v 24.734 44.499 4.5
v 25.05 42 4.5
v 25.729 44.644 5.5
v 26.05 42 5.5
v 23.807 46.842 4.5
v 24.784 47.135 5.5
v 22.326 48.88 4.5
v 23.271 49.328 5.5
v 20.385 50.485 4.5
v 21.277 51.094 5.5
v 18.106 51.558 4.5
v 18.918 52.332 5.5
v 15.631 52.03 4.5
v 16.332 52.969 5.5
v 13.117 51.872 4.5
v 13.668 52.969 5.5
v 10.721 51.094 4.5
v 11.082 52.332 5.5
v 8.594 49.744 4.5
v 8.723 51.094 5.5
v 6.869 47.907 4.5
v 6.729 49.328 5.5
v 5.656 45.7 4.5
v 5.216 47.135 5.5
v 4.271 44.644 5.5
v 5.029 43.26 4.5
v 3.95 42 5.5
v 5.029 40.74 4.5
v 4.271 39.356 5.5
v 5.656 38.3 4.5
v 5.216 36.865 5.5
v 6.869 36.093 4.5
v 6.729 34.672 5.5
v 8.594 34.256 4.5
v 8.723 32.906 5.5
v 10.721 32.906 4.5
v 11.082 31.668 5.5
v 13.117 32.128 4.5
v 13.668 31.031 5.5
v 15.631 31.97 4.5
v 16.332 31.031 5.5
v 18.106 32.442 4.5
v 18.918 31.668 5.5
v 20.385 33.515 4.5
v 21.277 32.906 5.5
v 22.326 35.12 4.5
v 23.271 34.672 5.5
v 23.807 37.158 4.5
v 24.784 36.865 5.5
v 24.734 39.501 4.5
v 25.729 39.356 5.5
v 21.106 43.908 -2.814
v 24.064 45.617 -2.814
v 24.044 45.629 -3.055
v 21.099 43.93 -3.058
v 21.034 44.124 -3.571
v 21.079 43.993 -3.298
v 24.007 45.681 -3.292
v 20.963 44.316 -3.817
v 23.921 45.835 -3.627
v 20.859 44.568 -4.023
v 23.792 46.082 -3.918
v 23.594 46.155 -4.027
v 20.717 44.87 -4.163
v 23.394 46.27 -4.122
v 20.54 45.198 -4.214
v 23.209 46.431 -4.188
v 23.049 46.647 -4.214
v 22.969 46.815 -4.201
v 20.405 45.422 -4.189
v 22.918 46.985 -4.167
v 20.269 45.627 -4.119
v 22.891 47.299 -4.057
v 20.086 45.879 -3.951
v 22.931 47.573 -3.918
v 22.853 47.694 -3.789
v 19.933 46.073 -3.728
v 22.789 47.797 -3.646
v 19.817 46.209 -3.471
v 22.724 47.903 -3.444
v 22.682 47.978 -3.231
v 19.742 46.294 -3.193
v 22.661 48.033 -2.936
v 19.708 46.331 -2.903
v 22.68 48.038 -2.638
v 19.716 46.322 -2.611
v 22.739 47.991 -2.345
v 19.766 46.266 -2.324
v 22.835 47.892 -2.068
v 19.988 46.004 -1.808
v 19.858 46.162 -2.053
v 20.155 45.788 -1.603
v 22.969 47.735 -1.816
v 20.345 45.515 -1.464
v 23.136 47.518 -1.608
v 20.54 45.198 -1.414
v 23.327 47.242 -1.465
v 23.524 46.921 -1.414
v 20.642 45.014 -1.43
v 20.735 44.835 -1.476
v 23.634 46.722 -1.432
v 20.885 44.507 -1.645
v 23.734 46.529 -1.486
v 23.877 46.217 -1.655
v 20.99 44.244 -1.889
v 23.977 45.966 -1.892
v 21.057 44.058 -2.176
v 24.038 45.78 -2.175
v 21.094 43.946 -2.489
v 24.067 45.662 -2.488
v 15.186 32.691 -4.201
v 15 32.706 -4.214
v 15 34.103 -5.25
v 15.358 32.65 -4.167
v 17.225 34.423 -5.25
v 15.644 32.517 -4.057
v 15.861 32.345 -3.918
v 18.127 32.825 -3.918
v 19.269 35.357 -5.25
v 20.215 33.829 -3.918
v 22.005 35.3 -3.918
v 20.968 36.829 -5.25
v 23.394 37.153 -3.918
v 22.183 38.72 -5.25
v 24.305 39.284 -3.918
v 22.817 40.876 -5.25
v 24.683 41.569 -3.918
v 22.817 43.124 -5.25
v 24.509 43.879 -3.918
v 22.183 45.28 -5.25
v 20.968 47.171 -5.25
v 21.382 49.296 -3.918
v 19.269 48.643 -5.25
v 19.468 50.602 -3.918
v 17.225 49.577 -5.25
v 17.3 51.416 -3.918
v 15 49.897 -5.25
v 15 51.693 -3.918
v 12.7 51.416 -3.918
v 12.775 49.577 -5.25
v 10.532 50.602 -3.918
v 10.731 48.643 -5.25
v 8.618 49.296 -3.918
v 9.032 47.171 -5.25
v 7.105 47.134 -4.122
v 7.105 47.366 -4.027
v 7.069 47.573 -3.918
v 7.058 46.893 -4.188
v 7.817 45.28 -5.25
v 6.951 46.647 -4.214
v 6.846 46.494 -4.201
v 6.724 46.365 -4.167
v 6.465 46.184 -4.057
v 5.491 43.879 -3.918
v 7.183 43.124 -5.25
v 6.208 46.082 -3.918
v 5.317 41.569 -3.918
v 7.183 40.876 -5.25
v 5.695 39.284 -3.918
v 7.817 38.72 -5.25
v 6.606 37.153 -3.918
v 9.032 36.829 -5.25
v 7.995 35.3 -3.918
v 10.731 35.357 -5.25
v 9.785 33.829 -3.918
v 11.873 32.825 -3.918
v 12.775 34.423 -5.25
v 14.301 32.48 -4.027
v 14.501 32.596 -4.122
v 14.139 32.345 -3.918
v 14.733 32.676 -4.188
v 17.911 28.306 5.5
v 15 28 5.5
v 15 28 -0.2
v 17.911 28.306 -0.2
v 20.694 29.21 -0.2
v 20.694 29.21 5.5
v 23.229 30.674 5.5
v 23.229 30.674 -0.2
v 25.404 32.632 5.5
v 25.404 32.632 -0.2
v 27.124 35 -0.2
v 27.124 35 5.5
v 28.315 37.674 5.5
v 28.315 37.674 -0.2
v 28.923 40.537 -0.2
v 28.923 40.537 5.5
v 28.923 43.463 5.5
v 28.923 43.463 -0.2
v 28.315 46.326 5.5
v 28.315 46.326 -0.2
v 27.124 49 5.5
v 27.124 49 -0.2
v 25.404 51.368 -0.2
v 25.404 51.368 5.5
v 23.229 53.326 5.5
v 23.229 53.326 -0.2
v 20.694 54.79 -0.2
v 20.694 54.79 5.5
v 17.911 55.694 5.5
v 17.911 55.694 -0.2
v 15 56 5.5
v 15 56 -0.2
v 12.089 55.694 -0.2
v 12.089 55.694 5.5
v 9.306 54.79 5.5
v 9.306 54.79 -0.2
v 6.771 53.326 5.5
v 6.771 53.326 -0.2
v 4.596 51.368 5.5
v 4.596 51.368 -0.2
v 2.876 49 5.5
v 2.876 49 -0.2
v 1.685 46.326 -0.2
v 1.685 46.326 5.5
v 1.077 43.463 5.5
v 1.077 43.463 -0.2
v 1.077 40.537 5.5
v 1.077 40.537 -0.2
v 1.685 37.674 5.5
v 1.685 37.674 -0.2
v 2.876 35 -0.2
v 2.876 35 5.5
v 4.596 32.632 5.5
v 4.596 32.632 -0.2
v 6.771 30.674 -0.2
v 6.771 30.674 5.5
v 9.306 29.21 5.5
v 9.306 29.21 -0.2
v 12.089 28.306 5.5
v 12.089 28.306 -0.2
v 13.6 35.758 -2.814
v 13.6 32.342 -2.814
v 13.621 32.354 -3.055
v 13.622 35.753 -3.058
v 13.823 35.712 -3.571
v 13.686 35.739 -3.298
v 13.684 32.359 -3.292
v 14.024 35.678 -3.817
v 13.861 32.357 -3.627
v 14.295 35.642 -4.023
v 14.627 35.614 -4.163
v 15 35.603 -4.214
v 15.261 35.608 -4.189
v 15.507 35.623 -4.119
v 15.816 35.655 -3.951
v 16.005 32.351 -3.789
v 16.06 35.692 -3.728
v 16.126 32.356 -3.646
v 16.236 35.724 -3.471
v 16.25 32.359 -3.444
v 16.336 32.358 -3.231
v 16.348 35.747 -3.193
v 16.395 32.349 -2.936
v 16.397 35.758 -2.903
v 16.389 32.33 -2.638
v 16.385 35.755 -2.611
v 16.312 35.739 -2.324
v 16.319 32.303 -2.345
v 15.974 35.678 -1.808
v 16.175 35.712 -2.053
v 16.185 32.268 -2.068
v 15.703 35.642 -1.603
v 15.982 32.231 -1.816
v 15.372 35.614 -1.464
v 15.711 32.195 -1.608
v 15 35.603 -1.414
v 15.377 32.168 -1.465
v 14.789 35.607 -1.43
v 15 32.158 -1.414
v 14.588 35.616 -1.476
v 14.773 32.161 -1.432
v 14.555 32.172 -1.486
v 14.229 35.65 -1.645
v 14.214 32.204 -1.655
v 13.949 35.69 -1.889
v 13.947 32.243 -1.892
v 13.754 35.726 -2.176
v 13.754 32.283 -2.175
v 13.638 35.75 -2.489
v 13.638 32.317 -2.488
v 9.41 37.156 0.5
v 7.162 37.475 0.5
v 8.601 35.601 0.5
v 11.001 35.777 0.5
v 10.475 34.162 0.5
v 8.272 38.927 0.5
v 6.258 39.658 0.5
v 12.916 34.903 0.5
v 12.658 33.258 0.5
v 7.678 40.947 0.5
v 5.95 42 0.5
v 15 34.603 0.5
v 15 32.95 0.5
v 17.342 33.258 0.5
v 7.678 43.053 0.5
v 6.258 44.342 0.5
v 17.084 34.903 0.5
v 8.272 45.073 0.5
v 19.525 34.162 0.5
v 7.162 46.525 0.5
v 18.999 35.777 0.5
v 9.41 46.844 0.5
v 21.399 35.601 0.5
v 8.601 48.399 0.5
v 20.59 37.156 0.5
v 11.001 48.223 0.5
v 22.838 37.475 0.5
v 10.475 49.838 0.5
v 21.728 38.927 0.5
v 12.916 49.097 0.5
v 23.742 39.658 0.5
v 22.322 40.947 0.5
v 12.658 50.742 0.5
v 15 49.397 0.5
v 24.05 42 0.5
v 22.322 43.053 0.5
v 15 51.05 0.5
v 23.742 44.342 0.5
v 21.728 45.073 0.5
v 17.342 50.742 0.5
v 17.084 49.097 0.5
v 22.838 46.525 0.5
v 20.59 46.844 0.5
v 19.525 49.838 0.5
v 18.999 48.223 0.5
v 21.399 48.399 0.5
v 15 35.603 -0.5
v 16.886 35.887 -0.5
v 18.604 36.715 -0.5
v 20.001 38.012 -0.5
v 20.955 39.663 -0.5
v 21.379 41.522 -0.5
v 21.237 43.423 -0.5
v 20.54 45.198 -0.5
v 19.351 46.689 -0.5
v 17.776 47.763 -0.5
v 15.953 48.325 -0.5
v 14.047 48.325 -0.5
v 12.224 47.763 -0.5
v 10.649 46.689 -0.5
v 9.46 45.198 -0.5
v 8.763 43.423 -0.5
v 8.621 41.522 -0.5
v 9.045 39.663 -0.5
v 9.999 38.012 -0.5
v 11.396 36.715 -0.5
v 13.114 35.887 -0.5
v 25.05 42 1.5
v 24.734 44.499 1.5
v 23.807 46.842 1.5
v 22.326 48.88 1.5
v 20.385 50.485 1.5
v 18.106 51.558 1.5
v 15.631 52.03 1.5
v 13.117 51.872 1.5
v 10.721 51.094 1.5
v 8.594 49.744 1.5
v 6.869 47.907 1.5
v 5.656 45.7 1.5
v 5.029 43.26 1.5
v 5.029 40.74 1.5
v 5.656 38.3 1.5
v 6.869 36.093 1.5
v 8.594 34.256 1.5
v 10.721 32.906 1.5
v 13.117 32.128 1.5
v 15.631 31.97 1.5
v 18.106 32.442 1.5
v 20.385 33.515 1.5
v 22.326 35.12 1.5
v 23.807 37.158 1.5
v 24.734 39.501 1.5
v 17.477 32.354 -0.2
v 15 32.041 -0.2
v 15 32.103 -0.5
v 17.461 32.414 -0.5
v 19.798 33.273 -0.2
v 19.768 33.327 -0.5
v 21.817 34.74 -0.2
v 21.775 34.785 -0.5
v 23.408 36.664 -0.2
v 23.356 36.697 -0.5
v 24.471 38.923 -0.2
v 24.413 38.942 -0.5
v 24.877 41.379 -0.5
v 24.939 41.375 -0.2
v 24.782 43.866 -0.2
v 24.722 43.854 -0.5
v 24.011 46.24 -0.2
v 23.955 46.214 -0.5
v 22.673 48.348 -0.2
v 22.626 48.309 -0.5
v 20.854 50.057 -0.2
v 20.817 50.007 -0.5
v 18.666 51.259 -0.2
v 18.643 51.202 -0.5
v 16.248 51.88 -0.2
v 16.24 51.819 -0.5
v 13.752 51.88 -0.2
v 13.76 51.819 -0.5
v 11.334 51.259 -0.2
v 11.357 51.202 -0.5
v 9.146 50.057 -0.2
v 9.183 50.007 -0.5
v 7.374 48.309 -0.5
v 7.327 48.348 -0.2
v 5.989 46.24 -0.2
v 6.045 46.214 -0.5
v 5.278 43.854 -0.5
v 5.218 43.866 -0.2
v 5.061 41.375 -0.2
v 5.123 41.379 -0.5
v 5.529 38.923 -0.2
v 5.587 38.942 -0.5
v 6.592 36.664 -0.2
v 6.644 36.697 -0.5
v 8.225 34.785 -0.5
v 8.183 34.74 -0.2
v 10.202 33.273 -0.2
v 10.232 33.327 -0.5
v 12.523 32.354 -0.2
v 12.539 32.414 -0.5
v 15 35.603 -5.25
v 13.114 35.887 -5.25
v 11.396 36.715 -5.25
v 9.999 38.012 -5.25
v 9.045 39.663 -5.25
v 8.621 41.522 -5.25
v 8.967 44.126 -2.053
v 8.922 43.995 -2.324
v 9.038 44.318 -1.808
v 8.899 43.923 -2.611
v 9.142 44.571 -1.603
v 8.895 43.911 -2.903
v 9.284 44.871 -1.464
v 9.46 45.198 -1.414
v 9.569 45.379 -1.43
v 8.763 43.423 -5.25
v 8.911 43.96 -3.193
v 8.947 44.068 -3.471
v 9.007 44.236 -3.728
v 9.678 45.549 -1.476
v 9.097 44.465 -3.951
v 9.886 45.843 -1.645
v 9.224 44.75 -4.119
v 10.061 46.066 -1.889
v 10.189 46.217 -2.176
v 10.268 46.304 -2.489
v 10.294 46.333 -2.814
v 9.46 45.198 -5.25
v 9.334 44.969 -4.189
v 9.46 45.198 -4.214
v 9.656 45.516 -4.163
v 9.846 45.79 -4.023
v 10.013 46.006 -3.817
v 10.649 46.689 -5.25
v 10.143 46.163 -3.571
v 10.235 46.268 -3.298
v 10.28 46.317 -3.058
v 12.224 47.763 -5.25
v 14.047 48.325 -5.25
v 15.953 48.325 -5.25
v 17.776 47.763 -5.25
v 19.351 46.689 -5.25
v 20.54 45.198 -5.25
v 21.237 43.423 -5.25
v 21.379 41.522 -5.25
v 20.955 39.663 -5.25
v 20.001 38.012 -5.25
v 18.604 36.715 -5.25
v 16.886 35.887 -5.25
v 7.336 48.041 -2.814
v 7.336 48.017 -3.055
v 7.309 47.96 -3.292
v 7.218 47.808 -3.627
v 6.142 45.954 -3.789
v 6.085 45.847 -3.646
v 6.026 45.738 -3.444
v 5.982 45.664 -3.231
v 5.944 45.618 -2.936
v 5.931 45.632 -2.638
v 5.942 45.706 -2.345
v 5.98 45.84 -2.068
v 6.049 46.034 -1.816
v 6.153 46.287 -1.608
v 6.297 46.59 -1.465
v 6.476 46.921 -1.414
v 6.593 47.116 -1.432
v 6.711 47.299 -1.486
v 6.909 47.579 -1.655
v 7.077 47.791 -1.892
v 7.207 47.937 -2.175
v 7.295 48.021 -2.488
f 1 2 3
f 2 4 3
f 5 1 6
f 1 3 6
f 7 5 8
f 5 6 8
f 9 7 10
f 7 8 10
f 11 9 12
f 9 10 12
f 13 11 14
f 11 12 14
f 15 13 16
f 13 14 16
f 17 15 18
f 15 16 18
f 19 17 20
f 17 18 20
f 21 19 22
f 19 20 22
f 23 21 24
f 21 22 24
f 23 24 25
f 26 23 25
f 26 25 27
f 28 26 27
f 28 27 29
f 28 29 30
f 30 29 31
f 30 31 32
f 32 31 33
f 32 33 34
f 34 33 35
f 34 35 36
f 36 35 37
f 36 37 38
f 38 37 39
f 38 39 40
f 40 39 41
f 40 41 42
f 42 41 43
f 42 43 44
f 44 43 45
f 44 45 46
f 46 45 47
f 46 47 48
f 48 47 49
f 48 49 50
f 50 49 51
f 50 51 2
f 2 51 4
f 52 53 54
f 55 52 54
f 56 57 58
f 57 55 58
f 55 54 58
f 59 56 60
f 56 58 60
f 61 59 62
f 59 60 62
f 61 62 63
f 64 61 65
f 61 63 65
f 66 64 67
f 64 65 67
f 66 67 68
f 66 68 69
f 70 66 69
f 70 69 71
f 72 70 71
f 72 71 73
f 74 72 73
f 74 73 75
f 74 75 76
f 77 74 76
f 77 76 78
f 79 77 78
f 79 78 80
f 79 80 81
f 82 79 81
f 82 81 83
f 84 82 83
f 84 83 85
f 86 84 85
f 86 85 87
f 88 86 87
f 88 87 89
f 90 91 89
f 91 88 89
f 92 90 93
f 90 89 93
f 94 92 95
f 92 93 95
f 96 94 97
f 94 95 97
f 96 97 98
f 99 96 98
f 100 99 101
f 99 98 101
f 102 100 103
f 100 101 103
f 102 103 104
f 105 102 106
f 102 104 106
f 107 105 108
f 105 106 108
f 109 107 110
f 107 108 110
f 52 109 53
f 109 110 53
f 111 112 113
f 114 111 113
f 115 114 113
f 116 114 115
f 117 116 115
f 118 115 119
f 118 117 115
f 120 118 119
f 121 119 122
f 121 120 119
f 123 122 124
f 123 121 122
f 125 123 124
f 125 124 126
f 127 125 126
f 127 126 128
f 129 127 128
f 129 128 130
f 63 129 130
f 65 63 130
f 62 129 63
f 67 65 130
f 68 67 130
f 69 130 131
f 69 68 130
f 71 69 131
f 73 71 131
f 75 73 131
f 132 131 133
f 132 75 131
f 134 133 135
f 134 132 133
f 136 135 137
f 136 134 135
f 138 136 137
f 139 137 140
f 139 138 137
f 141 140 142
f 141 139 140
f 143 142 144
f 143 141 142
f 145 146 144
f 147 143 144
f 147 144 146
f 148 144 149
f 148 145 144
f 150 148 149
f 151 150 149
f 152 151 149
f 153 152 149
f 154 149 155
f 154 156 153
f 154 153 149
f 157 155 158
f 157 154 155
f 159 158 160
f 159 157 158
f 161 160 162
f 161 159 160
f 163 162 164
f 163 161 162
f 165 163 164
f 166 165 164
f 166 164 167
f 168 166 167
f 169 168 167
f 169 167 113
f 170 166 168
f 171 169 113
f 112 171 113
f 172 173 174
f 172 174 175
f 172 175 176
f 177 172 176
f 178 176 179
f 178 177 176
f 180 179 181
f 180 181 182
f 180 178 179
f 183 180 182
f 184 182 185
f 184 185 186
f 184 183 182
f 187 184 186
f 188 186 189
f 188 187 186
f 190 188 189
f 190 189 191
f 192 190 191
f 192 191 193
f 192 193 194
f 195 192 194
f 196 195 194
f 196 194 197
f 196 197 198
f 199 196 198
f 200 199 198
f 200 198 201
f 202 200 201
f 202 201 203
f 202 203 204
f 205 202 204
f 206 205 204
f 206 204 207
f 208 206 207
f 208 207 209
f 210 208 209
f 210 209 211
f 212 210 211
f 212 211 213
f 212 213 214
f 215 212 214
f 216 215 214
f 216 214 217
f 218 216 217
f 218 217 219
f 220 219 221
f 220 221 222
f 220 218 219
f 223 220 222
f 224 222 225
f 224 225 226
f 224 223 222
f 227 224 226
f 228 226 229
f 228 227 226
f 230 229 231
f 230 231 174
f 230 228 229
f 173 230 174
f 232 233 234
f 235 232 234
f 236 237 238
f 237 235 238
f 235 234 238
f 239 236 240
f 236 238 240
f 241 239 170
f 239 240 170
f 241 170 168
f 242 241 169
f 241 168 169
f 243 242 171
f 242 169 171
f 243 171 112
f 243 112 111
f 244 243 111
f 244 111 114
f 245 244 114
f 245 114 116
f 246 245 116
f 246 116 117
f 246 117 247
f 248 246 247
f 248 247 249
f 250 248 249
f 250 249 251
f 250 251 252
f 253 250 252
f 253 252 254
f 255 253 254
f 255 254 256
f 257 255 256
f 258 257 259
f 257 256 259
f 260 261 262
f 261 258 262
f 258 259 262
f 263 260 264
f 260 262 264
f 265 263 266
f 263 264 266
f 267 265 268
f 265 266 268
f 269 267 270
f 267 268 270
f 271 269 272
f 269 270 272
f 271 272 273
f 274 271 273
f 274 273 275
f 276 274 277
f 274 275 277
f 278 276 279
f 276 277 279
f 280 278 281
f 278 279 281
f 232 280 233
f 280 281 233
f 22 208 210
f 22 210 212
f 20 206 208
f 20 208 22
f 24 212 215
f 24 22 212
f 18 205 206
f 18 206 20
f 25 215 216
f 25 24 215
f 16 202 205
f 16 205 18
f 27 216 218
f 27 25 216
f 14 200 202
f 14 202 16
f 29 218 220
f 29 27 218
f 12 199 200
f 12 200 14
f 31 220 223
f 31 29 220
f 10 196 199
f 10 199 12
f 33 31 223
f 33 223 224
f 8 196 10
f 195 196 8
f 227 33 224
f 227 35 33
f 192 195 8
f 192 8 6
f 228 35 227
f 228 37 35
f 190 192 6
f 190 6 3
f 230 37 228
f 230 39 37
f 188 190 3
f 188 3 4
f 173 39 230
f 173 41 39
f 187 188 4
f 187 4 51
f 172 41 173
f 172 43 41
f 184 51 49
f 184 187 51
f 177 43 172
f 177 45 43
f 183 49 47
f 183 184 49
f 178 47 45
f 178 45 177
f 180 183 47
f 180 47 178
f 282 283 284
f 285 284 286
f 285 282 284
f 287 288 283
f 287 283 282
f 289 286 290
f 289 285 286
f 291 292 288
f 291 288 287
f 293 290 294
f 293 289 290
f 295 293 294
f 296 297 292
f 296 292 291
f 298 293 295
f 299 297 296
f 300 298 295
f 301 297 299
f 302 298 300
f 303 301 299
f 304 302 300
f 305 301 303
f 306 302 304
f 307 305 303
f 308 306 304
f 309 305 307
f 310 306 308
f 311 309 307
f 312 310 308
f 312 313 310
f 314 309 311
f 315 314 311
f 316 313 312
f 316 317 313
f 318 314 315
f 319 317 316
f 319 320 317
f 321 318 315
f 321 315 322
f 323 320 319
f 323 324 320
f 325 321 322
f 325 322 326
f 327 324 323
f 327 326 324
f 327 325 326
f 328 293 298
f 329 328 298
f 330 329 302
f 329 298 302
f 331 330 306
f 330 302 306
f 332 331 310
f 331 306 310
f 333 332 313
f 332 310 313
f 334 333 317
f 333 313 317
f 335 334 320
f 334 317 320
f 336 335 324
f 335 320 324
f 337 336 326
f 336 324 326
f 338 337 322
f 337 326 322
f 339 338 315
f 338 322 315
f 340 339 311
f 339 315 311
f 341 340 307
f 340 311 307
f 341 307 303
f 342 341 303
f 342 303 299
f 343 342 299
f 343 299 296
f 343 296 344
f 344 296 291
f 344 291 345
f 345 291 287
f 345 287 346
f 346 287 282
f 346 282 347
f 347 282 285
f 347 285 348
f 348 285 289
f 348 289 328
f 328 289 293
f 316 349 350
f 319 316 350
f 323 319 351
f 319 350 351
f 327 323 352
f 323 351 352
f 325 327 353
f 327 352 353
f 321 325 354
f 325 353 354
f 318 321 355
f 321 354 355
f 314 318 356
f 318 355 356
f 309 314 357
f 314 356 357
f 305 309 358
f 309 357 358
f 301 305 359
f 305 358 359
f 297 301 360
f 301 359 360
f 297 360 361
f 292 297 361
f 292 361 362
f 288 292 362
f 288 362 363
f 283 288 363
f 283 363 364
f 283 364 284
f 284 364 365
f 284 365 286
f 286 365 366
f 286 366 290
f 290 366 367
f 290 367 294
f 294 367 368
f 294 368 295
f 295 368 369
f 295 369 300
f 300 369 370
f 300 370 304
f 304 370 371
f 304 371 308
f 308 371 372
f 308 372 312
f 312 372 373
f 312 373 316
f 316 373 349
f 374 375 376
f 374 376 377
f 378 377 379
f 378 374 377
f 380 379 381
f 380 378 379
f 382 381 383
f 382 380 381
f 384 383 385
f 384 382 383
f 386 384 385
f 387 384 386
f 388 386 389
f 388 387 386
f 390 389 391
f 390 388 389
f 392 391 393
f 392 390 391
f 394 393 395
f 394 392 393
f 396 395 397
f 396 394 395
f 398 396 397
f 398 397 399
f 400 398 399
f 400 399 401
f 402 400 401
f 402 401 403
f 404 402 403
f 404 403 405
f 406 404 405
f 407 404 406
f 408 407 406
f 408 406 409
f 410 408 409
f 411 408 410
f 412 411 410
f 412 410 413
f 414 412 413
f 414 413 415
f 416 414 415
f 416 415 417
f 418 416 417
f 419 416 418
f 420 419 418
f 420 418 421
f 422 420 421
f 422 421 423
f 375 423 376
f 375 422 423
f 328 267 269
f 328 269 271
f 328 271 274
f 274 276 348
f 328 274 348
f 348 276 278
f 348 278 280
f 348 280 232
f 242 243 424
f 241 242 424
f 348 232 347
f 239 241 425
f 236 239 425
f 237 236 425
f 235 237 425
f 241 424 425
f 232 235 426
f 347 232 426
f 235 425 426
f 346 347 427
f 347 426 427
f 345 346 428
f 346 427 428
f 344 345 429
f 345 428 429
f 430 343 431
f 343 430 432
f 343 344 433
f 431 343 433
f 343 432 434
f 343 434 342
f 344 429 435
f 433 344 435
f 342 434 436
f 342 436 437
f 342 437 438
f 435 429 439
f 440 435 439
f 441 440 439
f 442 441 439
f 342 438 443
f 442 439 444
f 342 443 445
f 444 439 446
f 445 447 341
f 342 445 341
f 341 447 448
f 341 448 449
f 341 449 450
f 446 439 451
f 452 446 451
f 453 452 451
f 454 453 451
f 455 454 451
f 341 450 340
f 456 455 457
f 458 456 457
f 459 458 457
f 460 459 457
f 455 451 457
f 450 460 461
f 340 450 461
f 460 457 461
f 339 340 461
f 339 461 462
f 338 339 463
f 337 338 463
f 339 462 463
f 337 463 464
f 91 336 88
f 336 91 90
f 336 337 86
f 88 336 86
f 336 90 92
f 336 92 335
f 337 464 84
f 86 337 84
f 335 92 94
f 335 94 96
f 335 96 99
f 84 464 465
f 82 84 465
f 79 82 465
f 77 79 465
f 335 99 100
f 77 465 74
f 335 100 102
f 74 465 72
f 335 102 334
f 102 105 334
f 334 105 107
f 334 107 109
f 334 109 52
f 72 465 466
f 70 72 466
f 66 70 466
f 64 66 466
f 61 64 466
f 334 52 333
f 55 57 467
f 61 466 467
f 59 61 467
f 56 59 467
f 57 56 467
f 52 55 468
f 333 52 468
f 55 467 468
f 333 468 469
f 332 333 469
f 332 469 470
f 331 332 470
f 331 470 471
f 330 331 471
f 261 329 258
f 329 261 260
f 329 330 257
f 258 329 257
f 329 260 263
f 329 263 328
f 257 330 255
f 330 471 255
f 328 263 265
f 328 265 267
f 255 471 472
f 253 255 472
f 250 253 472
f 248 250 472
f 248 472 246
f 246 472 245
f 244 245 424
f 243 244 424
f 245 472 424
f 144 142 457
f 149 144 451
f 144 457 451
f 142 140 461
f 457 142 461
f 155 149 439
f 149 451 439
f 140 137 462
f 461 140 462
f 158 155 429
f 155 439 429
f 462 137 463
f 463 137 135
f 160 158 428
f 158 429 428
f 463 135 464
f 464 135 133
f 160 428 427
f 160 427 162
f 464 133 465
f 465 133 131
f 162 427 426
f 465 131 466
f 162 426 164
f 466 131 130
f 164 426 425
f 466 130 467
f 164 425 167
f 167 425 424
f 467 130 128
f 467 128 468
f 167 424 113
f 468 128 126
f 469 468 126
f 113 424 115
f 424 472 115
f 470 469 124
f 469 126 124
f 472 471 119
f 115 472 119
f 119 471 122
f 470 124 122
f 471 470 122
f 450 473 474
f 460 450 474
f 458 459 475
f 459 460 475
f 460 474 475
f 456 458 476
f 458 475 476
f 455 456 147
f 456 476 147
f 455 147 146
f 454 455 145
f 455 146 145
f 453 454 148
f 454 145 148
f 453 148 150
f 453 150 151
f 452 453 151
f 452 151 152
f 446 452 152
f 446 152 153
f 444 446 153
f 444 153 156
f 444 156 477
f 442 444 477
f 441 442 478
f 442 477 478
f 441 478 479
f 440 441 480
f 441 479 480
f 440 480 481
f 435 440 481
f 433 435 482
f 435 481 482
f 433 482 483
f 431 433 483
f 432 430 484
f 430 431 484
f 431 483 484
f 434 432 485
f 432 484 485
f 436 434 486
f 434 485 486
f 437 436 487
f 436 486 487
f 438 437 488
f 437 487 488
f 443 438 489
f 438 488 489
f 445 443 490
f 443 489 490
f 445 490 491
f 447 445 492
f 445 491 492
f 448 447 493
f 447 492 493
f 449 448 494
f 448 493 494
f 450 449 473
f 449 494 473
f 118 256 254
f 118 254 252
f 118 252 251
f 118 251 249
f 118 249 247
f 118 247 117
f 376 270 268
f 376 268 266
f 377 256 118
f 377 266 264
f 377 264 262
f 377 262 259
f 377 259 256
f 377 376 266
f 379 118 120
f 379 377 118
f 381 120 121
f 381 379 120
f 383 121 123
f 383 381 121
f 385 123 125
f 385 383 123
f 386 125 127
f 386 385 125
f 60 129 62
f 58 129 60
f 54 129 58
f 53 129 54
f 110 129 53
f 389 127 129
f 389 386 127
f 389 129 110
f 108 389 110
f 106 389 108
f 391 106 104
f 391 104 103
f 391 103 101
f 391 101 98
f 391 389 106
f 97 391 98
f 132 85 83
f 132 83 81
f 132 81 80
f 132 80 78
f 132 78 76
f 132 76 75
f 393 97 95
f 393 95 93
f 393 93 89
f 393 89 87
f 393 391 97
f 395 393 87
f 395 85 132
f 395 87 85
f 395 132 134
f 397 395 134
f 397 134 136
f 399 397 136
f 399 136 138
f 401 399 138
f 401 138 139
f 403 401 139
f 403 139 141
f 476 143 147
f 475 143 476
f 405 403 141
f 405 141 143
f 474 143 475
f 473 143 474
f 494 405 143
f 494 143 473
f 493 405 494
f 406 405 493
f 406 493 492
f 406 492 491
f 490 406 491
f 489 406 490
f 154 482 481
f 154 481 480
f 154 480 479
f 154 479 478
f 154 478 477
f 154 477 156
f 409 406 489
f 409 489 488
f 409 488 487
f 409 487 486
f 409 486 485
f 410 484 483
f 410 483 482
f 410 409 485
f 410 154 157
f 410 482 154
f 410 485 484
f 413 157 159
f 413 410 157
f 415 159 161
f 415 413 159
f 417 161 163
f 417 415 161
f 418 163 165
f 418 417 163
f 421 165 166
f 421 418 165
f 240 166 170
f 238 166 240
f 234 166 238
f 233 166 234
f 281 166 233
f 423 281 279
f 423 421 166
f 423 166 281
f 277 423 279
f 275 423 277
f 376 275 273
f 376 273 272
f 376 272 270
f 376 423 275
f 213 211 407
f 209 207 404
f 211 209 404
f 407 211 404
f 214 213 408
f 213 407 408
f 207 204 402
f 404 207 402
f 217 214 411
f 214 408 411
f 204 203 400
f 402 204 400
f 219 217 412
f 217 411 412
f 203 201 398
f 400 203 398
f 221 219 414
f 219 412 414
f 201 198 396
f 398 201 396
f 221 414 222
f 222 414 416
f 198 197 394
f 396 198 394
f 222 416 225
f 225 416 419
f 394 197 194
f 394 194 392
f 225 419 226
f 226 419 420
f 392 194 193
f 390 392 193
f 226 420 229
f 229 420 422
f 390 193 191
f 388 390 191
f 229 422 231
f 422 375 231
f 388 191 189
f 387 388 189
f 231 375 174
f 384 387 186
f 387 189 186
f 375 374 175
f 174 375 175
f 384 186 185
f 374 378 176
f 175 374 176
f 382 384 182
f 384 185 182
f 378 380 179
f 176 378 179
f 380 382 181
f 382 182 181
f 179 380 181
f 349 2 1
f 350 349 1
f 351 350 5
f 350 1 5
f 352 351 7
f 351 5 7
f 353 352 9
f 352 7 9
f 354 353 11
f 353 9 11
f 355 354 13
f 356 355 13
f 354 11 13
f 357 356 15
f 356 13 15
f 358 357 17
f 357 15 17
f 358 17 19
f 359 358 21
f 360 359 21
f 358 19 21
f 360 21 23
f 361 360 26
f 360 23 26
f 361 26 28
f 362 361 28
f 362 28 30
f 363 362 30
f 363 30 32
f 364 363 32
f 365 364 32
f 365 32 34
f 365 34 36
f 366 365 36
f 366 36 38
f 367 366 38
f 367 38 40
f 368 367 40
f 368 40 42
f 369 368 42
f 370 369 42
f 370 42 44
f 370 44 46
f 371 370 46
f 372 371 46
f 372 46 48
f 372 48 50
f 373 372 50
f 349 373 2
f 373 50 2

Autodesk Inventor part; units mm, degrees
ref_plane "YZ Plane" through (0, 0, 0) normal (1, 0, 0) x (0, 1, 0)
ref_plane "XZ Plane" through (0, 0, 0) normal (0, 1, 0) x (-1, 0, 0)
ref_plane "XY Plane" through (0, 0, 0) normal (0, 0, 1) x (1, 0, 0)
ref_plane "Arbeitsebene1" through (15, 0, 0) normal (-1, 0, 0) x (0, 1, 0)
sketch "Skizze1" plane through (15, 0, 0) normal (-1, 0, 0) x (0, 1, 0)
  line L0 (32.6031, 0.5) -> (30.7237, 0.5) projected
  line L1 (30.7237, 4.25) -> (32.6031, 4.25) projected
  line L2 (30.7237, 0.5) -> (30.7237, 4.25) projected
  line L3 (32.6031, 0.5) -> (30.7237, 0.5) projected
  line L4 (30.7237, 4.7) -> (32.6031, 4.7) projected
  line L5 (30.7237, 0.5) -> (30.7237, 4.25) projected
  line L6 (30, 0.5) -> (32, 0.5) projected
  line L7 (30, 0.55) -> (30, 0.5) projected
  line L8 (32, 0.5) -> (32, 0.55) projected
  line L9 (32, 0.5) -> (32, 16.1)
  line L10 (52, 0.5) -> (52, 16.1)
  line L11 (42, 19.32) -> (42, -3.22)
  line L12 (32.6031, 0.5) -> (28, 0.5)
  line L13 (28, 0.5) -> (28, -5.5)
  line L14 (28, -5.5) -> (35.6031, -5.5)
  line L15 (35.6031, -5.5) -> (35.6031, 5.25)
  line L16 (35.6031, 5.25) -> (34.1031, 5.25)
  line L17 (32.6031, 0.5) -> (32.6031, 0.2)
  line L18 (32.6031, 0.2) -> (28, 0.2)
  line L19 (32, 0.55) -> (30, 0.55) projected
  line L20 (32.1031, 0.5) -> (32.0412, 0.2)
  line L21 (28, -5.5) -> (32, -5.5)
  line L22 (32, -5.5) -> (32, -13.5)
  line L23 (32, -13.5) -> (28, -13.5)
  line L24 (28, -13.5) -> (28, -5.5)
  line L25 (34.1031, 5.25) -> (32.307, 3.9176)
  line L26 (32.307, 3.9176) -> (32.1031, 0.5)
  point P0 (0, 0)
  dimension "d1" = 6
  dimension "d3" = 1
  dimension "d11" = 0.5
  dimension "d13" = 14
  dimension "d14" = 8
  dimension "d15" = 10
  dimension "d37" = 0.3
  dimension "d38" = 6.3969
revolve "Umdrehung1" add sketch "Skizze1" angle 360 about axis through (15, 42, -19.32) along (0, 0, 1) contours L17 L18 L20 L0 | L0 L26 L25 L16 L15 L14 L13 L18 L17
sketch "Skizze2" plane through (0, 0, 0) normal (0, 1, 0) x (-1, 0, 0)
  spline S0 degree 3 poles (-15, -4.25) (-12.1304, -4.4784) (-9.2732, -4.7067) (-7.1109, -4.9351) (-6.8554, -4.962) (-6.6095, -4.989) (-6.3738, -5.016) knots 0 0 0 0 0.7174 0.7174 0.7174 0.802142 0.802142 0.802142 0.802142 projected
  spline S1 degree 3 poles (-14.5016, -1.0897) (-11.6314, -1.3183) (-8.8183, -1.5469) (-6.7355, -1.7755) (-6.2054, -1.8336) (-5.7215, -1.8918) (-5.2918, -1.95) knots 0.041547 0.041547 0.041547 0.041547 0.759706 0.759706 0.759706 0.942478 0.942478 0.942478 0.942478 projected
  circle A0 centre (-15, -2.8138) radius 1.4
  line L0 (-15, 1.0048) -> (-15, -6.0288) projected
  point P0 (0, 0)
  dimension "d5" = 2.8
extrude "Extrusion1" cut sketch "Skizze2" along normal up to surface
pattern_circular "Runde Anordnung1" count 3 over 360 about axis through (15, 42, 2.65) along (0, 0, -1) of "Extrusion1"
chamfer "Fase1" distance 1 angle 45 1 edges at (15, 48.3969, 5.5)
sketch "Skizze6" plane through (15, 42, 5.5) normal (0, 0, 1) x (1, 0, 0)
  circle A0 centre (0, 0) radius 14 projected
  circle A1 centre (0, 0) radius 7.3969 projected
  circle A2 centre (0, 0) radius 10.05
  point P0 (-15, -42)
  dimension "d31" = 20.1
extrude "Extrusion4" cut sketch "Skizze6" against normal blind 5 contours A1 | A2
chamfer "Fase3" distance 1 angle 45 3 edges at (15, 48.3969, 0.5) (4.95, 42, 5.5) (4.95, 42, 0.5)
properties part number "30_Linear_Stage_NEMA11_baseholder_bayonetmount_objective_v0"
